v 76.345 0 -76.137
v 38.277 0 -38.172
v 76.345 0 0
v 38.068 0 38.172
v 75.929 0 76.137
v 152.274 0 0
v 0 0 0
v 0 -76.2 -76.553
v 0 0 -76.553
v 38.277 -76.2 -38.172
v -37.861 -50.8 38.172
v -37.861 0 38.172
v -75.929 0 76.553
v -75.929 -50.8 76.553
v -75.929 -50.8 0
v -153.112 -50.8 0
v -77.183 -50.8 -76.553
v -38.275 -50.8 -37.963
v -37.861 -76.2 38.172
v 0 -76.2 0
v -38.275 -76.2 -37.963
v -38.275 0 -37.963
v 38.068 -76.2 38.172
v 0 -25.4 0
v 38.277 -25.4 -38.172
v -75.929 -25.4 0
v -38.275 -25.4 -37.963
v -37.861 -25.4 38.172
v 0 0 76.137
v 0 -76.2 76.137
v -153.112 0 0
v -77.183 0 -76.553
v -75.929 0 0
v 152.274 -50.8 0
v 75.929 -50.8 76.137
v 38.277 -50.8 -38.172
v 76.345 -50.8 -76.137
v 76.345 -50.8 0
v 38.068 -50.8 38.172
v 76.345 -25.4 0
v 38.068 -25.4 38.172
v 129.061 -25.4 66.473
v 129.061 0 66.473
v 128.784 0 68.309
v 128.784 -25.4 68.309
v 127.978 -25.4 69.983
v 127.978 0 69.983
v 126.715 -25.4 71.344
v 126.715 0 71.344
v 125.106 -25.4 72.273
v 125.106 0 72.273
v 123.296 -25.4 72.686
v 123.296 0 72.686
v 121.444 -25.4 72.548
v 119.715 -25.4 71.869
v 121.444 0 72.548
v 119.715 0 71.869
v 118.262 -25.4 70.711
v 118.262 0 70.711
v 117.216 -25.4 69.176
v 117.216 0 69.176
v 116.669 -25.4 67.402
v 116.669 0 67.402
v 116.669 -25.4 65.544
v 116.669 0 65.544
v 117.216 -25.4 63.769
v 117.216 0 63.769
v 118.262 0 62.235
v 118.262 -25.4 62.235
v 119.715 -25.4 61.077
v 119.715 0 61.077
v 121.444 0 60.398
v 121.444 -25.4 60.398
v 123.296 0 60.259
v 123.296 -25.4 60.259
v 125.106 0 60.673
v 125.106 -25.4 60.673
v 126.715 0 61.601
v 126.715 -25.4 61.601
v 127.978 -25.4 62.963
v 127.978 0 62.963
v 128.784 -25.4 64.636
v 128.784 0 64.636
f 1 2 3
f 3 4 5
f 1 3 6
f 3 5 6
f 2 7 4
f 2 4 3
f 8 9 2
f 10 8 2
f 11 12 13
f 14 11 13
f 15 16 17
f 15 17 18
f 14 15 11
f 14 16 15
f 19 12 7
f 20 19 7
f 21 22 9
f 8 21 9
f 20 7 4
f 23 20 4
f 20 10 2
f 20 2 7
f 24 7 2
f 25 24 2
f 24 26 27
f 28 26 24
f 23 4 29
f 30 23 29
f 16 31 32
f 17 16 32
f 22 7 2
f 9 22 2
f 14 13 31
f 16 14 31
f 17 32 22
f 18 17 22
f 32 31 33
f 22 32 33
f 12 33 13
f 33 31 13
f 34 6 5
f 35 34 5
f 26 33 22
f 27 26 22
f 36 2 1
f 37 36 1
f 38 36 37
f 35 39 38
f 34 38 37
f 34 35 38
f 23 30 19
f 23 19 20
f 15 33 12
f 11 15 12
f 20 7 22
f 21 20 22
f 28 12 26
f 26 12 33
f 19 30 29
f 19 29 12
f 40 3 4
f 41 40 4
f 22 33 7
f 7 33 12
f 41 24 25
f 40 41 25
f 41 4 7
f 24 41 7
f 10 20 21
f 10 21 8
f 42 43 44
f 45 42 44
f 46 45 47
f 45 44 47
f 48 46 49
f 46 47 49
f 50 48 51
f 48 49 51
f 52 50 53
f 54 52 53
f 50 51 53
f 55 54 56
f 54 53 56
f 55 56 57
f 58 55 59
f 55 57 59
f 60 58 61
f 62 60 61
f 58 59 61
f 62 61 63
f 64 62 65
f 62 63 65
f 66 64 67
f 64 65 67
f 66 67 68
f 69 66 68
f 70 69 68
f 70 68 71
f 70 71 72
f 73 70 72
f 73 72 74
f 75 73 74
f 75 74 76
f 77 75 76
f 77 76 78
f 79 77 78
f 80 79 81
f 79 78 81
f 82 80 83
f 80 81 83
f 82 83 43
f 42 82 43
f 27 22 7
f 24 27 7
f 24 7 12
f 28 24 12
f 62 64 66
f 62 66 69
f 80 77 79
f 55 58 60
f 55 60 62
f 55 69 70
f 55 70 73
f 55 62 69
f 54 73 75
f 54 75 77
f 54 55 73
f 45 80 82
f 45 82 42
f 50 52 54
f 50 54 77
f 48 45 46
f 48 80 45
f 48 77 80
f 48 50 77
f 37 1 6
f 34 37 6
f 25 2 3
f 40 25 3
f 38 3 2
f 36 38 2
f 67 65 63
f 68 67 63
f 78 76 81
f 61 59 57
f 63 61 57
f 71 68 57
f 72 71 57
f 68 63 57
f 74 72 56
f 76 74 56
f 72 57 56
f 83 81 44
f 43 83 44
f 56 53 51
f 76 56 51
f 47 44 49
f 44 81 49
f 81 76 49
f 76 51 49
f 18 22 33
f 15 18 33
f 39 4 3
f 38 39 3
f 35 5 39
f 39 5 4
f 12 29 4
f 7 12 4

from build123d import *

# Parameters (mm, degrees)
F1_DEPTH = 25.4
F2_DEPTH = 50.8
F3_DEPTH = 76.2
F4_R     = 6.230888
F5_DEPTH = 25.4


with BuildPart() as f1:
    # F0 (on Front) → F1 (new body)
    with BuildSketch(Plane.XZ):
        Polygon((-37.861094, 38.172252), (-75.929344, 0), (-38.275399, -37.9634), (0, 0), align=None)
        Polygon((38.06825, 38.172252), (0, 0), (38.276539, -38.172252), (76.344789, 0), align=None)
    extrude(amount=F1_DEPTH)


with BuildPart() as f2:
    # F0 (on Front) → F2 (new body)
    with BuildSketch(Plane.XZ):
        Polygon((-38.275399, -37.9634), (-75.929344, 0), (-37.861094, 38.172252), (-75.929344, 76.553363), (-153.111854, 0), (-77.18251, -76.553363), align=None)
        Polygon((75.929344, 76.136783), (38.06825, 38.172252), (76.344789, 0), (38.276539, -38.172252), (76.344789, -76.136783), (152.274132, 0), align=None)
    extrude(amount=F2_DEPTH)


with BuildPart() as f3:
    # F0 (on Front) → F3 (new body)
    with BuildSketch(Plane.XZ):
        Polygon((0, 76.136783), (-37.861094, 38.172252), (0, 0), (38.06825, 38.172252), align=None)
        Polygon((0, 0), (-38.275399, -37.9634), (0, -76.553363), (38.276539, -38.172252), align=None)
    extrude(amount=F3_DEPTH)


with BuildPart() as f5:
    # F4 (on Front) → F5 (new body)
    with BuildSketch(Plane.XZ):
        with Locations((122.830011, 66.472888)):
            Circle(F4_R)
    extrude(amount=F5_DEPTH)


solid = Compound([f1.part, f2.part, f3.part, f5.part])
